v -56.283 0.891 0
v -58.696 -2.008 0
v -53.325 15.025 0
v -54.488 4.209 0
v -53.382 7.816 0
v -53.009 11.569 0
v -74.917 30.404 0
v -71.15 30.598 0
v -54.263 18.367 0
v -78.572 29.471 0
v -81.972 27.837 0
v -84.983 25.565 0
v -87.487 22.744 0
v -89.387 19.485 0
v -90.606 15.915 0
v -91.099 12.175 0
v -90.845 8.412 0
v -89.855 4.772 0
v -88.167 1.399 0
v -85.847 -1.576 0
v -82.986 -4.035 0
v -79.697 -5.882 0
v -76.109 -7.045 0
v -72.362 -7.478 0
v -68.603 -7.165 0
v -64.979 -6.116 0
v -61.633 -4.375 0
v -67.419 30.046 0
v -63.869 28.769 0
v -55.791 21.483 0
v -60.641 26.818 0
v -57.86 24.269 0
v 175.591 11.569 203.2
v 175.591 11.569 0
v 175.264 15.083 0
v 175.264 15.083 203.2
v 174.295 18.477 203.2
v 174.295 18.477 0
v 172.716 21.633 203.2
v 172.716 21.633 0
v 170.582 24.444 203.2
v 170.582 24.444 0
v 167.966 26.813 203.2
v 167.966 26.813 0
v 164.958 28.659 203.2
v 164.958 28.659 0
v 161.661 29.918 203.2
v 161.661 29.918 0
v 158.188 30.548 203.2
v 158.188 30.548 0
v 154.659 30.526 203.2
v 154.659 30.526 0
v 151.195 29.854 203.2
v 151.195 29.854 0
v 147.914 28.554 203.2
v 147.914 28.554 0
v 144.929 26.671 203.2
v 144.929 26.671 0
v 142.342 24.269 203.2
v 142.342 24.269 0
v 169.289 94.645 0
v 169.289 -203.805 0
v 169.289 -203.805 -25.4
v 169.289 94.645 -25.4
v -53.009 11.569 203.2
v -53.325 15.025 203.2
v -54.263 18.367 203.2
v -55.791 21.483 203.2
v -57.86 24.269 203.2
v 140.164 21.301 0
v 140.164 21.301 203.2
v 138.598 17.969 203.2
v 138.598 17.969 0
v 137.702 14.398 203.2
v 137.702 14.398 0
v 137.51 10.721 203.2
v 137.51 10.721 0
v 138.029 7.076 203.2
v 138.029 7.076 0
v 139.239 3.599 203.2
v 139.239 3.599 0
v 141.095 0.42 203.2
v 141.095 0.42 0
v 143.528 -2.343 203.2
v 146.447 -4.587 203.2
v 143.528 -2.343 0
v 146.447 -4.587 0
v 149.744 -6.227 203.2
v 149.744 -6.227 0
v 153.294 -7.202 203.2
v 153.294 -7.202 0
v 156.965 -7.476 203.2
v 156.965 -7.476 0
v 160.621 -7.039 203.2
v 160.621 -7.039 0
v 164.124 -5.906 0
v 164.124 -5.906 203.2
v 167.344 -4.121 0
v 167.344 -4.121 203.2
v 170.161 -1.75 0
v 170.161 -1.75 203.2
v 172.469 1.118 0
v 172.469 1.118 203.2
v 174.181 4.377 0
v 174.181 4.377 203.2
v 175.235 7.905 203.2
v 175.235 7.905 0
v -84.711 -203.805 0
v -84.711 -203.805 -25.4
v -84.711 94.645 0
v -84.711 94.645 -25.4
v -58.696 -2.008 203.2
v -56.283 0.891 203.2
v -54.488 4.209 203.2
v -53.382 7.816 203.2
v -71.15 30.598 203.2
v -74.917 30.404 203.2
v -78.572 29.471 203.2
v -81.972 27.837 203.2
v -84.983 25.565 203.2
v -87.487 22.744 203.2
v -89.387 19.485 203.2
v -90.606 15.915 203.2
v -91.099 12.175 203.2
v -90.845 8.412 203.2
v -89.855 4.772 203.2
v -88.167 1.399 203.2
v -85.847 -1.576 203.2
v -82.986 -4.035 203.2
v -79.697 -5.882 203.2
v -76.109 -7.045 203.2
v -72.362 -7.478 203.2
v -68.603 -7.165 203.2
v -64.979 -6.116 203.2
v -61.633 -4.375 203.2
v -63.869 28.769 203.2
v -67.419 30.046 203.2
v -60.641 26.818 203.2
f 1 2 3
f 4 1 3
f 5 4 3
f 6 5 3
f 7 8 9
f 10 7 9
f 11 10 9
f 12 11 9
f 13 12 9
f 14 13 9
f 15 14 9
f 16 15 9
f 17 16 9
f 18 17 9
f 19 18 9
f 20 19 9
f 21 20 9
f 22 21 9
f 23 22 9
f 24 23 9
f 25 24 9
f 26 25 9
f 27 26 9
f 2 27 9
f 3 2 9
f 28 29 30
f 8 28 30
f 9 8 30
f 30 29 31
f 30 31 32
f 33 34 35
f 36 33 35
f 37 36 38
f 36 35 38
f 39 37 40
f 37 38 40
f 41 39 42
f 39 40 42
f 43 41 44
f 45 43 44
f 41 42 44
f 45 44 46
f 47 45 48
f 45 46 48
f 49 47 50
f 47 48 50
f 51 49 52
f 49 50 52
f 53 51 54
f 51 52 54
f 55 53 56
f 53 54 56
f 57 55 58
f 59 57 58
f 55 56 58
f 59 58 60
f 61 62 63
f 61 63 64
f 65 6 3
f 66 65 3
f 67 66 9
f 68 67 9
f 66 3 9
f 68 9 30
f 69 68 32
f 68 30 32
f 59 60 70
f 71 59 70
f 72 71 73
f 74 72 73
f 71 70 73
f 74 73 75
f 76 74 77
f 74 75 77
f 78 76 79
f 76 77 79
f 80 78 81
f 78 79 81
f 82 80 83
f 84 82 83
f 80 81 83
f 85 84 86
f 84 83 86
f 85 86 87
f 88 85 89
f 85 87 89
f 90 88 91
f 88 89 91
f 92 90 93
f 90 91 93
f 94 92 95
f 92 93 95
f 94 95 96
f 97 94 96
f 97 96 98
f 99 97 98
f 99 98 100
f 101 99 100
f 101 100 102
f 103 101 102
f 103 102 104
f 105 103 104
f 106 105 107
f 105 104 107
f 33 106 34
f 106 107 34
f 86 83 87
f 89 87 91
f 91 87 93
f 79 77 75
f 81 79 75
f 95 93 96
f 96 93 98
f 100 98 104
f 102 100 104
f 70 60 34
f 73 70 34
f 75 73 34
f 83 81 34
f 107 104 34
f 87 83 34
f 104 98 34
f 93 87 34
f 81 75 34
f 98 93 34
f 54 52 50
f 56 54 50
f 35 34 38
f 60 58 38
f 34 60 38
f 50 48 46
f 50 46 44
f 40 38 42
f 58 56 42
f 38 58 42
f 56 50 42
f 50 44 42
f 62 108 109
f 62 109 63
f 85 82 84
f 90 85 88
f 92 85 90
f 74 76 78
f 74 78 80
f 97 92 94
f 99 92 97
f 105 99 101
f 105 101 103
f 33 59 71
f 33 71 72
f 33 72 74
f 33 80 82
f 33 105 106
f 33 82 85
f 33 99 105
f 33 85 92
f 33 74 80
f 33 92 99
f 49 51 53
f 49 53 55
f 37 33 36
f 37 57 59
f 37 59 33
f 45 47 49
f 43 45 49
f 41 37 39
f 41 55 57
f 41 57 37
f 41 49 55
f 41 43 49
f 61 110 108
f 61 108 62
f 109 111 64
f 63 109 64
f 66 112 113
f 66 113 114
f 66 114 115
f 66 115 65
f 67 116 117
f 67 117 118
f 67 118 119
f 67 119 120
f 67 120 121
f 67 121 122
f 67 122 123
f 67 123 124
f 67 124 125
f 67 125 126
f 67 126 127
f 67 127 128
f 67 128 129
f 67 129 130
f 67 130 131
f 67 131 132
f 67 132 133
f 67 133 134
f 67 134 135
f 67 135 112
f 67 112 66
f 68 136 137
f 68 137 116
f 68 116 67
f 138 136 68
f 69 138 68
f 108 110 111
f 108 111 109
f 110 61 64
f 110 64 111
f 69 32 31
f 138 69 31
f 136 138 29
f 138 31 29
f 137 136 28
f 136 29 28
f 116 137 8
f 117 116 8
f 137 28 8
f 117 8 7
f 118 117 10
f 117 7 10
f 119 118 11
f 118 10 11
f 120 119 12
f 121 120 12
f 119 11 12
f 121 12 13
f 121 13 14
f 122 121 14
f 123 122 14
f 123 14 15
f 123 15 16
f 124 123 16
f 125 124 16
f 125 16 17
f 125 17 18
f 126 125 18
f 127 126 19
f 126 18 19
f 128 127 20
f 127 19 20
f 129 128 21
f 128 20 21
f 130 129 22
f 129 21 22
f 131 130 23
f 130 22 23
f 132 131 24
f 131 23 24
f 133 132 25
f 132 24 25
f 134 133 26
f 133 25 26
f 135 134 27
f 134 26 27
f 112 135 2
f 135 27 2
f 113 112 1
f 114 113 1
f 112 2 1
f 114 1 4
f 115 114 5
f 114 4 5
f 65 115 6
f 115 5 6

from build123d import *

# Parameters (mm, degrees)
F1_DEPTH = 203.2
F2_R     = 3.9466394405
F3_DEPTH = 25.4


# Not quite as in the source:
# - the program builds the solid bodies; features that only make, move or delete a surface that nothing else refers to are left out


with BuildPart() as f1:
    # F0 (on Top) → F1 (new body)
    with BuildSketch(Plane.XY):
        with BuildLine():
            ThreePointArc((175.5912042022, 11.5693333262), (163.3386650124, 29.3653167645), (142.3421725451, 24.2693333262))
            ThreePointArc((142.3421725451, 24.2693333262), (149.743743392, -6.226650112), (175.5912042022, 11.5693333262))
        make_face()
    extrude(amount=F1_DEPTH)


with BuildPart() as f1b:
    # F0 (on Top) → F1, piece 2 (new body)
    with BuildSketch(Plane.XY):
        with BuildLine():
            ThreePointArc((-53.0087957978, 11.5693333262), (-54.2628123596, 18.3667941364), (-57.8597641407, 24.2693333262))
            ThreePointArc((-57.8597641407, 24.2693333262), (-89.8547792361, 4.771872516), (-53.0087957978, 11.5693333262))
        make_face()
    extrude(amount=F1_DEPTH)


with BuildPart() as f3:
    # F2 (on Top) → F3 (new body)
    with BuildSketch(Plane.XY):
        Polygon((169.2891323054, -203.8045942991), (169.2891323054, 18.4454057009), (169.2891323054, 94.6454057009), (37.2091323054, 94.6454057009), (-84.7108676946, 94.6454057009), (-84.7108676946, 18.4454057009), (-84.7108676946, -203.8045942991), align=None)
        with Locations((42.2891323054, 0)):
            Circle(F2_R, mode=Mode.SUBTRACT)
        with Locations((42.2891323054, 0)):
            Circle(F2_R)
    extrude(amount=-F3_DEPTH)


solid = Compound([f1.part, f1b.part, f3.part])
